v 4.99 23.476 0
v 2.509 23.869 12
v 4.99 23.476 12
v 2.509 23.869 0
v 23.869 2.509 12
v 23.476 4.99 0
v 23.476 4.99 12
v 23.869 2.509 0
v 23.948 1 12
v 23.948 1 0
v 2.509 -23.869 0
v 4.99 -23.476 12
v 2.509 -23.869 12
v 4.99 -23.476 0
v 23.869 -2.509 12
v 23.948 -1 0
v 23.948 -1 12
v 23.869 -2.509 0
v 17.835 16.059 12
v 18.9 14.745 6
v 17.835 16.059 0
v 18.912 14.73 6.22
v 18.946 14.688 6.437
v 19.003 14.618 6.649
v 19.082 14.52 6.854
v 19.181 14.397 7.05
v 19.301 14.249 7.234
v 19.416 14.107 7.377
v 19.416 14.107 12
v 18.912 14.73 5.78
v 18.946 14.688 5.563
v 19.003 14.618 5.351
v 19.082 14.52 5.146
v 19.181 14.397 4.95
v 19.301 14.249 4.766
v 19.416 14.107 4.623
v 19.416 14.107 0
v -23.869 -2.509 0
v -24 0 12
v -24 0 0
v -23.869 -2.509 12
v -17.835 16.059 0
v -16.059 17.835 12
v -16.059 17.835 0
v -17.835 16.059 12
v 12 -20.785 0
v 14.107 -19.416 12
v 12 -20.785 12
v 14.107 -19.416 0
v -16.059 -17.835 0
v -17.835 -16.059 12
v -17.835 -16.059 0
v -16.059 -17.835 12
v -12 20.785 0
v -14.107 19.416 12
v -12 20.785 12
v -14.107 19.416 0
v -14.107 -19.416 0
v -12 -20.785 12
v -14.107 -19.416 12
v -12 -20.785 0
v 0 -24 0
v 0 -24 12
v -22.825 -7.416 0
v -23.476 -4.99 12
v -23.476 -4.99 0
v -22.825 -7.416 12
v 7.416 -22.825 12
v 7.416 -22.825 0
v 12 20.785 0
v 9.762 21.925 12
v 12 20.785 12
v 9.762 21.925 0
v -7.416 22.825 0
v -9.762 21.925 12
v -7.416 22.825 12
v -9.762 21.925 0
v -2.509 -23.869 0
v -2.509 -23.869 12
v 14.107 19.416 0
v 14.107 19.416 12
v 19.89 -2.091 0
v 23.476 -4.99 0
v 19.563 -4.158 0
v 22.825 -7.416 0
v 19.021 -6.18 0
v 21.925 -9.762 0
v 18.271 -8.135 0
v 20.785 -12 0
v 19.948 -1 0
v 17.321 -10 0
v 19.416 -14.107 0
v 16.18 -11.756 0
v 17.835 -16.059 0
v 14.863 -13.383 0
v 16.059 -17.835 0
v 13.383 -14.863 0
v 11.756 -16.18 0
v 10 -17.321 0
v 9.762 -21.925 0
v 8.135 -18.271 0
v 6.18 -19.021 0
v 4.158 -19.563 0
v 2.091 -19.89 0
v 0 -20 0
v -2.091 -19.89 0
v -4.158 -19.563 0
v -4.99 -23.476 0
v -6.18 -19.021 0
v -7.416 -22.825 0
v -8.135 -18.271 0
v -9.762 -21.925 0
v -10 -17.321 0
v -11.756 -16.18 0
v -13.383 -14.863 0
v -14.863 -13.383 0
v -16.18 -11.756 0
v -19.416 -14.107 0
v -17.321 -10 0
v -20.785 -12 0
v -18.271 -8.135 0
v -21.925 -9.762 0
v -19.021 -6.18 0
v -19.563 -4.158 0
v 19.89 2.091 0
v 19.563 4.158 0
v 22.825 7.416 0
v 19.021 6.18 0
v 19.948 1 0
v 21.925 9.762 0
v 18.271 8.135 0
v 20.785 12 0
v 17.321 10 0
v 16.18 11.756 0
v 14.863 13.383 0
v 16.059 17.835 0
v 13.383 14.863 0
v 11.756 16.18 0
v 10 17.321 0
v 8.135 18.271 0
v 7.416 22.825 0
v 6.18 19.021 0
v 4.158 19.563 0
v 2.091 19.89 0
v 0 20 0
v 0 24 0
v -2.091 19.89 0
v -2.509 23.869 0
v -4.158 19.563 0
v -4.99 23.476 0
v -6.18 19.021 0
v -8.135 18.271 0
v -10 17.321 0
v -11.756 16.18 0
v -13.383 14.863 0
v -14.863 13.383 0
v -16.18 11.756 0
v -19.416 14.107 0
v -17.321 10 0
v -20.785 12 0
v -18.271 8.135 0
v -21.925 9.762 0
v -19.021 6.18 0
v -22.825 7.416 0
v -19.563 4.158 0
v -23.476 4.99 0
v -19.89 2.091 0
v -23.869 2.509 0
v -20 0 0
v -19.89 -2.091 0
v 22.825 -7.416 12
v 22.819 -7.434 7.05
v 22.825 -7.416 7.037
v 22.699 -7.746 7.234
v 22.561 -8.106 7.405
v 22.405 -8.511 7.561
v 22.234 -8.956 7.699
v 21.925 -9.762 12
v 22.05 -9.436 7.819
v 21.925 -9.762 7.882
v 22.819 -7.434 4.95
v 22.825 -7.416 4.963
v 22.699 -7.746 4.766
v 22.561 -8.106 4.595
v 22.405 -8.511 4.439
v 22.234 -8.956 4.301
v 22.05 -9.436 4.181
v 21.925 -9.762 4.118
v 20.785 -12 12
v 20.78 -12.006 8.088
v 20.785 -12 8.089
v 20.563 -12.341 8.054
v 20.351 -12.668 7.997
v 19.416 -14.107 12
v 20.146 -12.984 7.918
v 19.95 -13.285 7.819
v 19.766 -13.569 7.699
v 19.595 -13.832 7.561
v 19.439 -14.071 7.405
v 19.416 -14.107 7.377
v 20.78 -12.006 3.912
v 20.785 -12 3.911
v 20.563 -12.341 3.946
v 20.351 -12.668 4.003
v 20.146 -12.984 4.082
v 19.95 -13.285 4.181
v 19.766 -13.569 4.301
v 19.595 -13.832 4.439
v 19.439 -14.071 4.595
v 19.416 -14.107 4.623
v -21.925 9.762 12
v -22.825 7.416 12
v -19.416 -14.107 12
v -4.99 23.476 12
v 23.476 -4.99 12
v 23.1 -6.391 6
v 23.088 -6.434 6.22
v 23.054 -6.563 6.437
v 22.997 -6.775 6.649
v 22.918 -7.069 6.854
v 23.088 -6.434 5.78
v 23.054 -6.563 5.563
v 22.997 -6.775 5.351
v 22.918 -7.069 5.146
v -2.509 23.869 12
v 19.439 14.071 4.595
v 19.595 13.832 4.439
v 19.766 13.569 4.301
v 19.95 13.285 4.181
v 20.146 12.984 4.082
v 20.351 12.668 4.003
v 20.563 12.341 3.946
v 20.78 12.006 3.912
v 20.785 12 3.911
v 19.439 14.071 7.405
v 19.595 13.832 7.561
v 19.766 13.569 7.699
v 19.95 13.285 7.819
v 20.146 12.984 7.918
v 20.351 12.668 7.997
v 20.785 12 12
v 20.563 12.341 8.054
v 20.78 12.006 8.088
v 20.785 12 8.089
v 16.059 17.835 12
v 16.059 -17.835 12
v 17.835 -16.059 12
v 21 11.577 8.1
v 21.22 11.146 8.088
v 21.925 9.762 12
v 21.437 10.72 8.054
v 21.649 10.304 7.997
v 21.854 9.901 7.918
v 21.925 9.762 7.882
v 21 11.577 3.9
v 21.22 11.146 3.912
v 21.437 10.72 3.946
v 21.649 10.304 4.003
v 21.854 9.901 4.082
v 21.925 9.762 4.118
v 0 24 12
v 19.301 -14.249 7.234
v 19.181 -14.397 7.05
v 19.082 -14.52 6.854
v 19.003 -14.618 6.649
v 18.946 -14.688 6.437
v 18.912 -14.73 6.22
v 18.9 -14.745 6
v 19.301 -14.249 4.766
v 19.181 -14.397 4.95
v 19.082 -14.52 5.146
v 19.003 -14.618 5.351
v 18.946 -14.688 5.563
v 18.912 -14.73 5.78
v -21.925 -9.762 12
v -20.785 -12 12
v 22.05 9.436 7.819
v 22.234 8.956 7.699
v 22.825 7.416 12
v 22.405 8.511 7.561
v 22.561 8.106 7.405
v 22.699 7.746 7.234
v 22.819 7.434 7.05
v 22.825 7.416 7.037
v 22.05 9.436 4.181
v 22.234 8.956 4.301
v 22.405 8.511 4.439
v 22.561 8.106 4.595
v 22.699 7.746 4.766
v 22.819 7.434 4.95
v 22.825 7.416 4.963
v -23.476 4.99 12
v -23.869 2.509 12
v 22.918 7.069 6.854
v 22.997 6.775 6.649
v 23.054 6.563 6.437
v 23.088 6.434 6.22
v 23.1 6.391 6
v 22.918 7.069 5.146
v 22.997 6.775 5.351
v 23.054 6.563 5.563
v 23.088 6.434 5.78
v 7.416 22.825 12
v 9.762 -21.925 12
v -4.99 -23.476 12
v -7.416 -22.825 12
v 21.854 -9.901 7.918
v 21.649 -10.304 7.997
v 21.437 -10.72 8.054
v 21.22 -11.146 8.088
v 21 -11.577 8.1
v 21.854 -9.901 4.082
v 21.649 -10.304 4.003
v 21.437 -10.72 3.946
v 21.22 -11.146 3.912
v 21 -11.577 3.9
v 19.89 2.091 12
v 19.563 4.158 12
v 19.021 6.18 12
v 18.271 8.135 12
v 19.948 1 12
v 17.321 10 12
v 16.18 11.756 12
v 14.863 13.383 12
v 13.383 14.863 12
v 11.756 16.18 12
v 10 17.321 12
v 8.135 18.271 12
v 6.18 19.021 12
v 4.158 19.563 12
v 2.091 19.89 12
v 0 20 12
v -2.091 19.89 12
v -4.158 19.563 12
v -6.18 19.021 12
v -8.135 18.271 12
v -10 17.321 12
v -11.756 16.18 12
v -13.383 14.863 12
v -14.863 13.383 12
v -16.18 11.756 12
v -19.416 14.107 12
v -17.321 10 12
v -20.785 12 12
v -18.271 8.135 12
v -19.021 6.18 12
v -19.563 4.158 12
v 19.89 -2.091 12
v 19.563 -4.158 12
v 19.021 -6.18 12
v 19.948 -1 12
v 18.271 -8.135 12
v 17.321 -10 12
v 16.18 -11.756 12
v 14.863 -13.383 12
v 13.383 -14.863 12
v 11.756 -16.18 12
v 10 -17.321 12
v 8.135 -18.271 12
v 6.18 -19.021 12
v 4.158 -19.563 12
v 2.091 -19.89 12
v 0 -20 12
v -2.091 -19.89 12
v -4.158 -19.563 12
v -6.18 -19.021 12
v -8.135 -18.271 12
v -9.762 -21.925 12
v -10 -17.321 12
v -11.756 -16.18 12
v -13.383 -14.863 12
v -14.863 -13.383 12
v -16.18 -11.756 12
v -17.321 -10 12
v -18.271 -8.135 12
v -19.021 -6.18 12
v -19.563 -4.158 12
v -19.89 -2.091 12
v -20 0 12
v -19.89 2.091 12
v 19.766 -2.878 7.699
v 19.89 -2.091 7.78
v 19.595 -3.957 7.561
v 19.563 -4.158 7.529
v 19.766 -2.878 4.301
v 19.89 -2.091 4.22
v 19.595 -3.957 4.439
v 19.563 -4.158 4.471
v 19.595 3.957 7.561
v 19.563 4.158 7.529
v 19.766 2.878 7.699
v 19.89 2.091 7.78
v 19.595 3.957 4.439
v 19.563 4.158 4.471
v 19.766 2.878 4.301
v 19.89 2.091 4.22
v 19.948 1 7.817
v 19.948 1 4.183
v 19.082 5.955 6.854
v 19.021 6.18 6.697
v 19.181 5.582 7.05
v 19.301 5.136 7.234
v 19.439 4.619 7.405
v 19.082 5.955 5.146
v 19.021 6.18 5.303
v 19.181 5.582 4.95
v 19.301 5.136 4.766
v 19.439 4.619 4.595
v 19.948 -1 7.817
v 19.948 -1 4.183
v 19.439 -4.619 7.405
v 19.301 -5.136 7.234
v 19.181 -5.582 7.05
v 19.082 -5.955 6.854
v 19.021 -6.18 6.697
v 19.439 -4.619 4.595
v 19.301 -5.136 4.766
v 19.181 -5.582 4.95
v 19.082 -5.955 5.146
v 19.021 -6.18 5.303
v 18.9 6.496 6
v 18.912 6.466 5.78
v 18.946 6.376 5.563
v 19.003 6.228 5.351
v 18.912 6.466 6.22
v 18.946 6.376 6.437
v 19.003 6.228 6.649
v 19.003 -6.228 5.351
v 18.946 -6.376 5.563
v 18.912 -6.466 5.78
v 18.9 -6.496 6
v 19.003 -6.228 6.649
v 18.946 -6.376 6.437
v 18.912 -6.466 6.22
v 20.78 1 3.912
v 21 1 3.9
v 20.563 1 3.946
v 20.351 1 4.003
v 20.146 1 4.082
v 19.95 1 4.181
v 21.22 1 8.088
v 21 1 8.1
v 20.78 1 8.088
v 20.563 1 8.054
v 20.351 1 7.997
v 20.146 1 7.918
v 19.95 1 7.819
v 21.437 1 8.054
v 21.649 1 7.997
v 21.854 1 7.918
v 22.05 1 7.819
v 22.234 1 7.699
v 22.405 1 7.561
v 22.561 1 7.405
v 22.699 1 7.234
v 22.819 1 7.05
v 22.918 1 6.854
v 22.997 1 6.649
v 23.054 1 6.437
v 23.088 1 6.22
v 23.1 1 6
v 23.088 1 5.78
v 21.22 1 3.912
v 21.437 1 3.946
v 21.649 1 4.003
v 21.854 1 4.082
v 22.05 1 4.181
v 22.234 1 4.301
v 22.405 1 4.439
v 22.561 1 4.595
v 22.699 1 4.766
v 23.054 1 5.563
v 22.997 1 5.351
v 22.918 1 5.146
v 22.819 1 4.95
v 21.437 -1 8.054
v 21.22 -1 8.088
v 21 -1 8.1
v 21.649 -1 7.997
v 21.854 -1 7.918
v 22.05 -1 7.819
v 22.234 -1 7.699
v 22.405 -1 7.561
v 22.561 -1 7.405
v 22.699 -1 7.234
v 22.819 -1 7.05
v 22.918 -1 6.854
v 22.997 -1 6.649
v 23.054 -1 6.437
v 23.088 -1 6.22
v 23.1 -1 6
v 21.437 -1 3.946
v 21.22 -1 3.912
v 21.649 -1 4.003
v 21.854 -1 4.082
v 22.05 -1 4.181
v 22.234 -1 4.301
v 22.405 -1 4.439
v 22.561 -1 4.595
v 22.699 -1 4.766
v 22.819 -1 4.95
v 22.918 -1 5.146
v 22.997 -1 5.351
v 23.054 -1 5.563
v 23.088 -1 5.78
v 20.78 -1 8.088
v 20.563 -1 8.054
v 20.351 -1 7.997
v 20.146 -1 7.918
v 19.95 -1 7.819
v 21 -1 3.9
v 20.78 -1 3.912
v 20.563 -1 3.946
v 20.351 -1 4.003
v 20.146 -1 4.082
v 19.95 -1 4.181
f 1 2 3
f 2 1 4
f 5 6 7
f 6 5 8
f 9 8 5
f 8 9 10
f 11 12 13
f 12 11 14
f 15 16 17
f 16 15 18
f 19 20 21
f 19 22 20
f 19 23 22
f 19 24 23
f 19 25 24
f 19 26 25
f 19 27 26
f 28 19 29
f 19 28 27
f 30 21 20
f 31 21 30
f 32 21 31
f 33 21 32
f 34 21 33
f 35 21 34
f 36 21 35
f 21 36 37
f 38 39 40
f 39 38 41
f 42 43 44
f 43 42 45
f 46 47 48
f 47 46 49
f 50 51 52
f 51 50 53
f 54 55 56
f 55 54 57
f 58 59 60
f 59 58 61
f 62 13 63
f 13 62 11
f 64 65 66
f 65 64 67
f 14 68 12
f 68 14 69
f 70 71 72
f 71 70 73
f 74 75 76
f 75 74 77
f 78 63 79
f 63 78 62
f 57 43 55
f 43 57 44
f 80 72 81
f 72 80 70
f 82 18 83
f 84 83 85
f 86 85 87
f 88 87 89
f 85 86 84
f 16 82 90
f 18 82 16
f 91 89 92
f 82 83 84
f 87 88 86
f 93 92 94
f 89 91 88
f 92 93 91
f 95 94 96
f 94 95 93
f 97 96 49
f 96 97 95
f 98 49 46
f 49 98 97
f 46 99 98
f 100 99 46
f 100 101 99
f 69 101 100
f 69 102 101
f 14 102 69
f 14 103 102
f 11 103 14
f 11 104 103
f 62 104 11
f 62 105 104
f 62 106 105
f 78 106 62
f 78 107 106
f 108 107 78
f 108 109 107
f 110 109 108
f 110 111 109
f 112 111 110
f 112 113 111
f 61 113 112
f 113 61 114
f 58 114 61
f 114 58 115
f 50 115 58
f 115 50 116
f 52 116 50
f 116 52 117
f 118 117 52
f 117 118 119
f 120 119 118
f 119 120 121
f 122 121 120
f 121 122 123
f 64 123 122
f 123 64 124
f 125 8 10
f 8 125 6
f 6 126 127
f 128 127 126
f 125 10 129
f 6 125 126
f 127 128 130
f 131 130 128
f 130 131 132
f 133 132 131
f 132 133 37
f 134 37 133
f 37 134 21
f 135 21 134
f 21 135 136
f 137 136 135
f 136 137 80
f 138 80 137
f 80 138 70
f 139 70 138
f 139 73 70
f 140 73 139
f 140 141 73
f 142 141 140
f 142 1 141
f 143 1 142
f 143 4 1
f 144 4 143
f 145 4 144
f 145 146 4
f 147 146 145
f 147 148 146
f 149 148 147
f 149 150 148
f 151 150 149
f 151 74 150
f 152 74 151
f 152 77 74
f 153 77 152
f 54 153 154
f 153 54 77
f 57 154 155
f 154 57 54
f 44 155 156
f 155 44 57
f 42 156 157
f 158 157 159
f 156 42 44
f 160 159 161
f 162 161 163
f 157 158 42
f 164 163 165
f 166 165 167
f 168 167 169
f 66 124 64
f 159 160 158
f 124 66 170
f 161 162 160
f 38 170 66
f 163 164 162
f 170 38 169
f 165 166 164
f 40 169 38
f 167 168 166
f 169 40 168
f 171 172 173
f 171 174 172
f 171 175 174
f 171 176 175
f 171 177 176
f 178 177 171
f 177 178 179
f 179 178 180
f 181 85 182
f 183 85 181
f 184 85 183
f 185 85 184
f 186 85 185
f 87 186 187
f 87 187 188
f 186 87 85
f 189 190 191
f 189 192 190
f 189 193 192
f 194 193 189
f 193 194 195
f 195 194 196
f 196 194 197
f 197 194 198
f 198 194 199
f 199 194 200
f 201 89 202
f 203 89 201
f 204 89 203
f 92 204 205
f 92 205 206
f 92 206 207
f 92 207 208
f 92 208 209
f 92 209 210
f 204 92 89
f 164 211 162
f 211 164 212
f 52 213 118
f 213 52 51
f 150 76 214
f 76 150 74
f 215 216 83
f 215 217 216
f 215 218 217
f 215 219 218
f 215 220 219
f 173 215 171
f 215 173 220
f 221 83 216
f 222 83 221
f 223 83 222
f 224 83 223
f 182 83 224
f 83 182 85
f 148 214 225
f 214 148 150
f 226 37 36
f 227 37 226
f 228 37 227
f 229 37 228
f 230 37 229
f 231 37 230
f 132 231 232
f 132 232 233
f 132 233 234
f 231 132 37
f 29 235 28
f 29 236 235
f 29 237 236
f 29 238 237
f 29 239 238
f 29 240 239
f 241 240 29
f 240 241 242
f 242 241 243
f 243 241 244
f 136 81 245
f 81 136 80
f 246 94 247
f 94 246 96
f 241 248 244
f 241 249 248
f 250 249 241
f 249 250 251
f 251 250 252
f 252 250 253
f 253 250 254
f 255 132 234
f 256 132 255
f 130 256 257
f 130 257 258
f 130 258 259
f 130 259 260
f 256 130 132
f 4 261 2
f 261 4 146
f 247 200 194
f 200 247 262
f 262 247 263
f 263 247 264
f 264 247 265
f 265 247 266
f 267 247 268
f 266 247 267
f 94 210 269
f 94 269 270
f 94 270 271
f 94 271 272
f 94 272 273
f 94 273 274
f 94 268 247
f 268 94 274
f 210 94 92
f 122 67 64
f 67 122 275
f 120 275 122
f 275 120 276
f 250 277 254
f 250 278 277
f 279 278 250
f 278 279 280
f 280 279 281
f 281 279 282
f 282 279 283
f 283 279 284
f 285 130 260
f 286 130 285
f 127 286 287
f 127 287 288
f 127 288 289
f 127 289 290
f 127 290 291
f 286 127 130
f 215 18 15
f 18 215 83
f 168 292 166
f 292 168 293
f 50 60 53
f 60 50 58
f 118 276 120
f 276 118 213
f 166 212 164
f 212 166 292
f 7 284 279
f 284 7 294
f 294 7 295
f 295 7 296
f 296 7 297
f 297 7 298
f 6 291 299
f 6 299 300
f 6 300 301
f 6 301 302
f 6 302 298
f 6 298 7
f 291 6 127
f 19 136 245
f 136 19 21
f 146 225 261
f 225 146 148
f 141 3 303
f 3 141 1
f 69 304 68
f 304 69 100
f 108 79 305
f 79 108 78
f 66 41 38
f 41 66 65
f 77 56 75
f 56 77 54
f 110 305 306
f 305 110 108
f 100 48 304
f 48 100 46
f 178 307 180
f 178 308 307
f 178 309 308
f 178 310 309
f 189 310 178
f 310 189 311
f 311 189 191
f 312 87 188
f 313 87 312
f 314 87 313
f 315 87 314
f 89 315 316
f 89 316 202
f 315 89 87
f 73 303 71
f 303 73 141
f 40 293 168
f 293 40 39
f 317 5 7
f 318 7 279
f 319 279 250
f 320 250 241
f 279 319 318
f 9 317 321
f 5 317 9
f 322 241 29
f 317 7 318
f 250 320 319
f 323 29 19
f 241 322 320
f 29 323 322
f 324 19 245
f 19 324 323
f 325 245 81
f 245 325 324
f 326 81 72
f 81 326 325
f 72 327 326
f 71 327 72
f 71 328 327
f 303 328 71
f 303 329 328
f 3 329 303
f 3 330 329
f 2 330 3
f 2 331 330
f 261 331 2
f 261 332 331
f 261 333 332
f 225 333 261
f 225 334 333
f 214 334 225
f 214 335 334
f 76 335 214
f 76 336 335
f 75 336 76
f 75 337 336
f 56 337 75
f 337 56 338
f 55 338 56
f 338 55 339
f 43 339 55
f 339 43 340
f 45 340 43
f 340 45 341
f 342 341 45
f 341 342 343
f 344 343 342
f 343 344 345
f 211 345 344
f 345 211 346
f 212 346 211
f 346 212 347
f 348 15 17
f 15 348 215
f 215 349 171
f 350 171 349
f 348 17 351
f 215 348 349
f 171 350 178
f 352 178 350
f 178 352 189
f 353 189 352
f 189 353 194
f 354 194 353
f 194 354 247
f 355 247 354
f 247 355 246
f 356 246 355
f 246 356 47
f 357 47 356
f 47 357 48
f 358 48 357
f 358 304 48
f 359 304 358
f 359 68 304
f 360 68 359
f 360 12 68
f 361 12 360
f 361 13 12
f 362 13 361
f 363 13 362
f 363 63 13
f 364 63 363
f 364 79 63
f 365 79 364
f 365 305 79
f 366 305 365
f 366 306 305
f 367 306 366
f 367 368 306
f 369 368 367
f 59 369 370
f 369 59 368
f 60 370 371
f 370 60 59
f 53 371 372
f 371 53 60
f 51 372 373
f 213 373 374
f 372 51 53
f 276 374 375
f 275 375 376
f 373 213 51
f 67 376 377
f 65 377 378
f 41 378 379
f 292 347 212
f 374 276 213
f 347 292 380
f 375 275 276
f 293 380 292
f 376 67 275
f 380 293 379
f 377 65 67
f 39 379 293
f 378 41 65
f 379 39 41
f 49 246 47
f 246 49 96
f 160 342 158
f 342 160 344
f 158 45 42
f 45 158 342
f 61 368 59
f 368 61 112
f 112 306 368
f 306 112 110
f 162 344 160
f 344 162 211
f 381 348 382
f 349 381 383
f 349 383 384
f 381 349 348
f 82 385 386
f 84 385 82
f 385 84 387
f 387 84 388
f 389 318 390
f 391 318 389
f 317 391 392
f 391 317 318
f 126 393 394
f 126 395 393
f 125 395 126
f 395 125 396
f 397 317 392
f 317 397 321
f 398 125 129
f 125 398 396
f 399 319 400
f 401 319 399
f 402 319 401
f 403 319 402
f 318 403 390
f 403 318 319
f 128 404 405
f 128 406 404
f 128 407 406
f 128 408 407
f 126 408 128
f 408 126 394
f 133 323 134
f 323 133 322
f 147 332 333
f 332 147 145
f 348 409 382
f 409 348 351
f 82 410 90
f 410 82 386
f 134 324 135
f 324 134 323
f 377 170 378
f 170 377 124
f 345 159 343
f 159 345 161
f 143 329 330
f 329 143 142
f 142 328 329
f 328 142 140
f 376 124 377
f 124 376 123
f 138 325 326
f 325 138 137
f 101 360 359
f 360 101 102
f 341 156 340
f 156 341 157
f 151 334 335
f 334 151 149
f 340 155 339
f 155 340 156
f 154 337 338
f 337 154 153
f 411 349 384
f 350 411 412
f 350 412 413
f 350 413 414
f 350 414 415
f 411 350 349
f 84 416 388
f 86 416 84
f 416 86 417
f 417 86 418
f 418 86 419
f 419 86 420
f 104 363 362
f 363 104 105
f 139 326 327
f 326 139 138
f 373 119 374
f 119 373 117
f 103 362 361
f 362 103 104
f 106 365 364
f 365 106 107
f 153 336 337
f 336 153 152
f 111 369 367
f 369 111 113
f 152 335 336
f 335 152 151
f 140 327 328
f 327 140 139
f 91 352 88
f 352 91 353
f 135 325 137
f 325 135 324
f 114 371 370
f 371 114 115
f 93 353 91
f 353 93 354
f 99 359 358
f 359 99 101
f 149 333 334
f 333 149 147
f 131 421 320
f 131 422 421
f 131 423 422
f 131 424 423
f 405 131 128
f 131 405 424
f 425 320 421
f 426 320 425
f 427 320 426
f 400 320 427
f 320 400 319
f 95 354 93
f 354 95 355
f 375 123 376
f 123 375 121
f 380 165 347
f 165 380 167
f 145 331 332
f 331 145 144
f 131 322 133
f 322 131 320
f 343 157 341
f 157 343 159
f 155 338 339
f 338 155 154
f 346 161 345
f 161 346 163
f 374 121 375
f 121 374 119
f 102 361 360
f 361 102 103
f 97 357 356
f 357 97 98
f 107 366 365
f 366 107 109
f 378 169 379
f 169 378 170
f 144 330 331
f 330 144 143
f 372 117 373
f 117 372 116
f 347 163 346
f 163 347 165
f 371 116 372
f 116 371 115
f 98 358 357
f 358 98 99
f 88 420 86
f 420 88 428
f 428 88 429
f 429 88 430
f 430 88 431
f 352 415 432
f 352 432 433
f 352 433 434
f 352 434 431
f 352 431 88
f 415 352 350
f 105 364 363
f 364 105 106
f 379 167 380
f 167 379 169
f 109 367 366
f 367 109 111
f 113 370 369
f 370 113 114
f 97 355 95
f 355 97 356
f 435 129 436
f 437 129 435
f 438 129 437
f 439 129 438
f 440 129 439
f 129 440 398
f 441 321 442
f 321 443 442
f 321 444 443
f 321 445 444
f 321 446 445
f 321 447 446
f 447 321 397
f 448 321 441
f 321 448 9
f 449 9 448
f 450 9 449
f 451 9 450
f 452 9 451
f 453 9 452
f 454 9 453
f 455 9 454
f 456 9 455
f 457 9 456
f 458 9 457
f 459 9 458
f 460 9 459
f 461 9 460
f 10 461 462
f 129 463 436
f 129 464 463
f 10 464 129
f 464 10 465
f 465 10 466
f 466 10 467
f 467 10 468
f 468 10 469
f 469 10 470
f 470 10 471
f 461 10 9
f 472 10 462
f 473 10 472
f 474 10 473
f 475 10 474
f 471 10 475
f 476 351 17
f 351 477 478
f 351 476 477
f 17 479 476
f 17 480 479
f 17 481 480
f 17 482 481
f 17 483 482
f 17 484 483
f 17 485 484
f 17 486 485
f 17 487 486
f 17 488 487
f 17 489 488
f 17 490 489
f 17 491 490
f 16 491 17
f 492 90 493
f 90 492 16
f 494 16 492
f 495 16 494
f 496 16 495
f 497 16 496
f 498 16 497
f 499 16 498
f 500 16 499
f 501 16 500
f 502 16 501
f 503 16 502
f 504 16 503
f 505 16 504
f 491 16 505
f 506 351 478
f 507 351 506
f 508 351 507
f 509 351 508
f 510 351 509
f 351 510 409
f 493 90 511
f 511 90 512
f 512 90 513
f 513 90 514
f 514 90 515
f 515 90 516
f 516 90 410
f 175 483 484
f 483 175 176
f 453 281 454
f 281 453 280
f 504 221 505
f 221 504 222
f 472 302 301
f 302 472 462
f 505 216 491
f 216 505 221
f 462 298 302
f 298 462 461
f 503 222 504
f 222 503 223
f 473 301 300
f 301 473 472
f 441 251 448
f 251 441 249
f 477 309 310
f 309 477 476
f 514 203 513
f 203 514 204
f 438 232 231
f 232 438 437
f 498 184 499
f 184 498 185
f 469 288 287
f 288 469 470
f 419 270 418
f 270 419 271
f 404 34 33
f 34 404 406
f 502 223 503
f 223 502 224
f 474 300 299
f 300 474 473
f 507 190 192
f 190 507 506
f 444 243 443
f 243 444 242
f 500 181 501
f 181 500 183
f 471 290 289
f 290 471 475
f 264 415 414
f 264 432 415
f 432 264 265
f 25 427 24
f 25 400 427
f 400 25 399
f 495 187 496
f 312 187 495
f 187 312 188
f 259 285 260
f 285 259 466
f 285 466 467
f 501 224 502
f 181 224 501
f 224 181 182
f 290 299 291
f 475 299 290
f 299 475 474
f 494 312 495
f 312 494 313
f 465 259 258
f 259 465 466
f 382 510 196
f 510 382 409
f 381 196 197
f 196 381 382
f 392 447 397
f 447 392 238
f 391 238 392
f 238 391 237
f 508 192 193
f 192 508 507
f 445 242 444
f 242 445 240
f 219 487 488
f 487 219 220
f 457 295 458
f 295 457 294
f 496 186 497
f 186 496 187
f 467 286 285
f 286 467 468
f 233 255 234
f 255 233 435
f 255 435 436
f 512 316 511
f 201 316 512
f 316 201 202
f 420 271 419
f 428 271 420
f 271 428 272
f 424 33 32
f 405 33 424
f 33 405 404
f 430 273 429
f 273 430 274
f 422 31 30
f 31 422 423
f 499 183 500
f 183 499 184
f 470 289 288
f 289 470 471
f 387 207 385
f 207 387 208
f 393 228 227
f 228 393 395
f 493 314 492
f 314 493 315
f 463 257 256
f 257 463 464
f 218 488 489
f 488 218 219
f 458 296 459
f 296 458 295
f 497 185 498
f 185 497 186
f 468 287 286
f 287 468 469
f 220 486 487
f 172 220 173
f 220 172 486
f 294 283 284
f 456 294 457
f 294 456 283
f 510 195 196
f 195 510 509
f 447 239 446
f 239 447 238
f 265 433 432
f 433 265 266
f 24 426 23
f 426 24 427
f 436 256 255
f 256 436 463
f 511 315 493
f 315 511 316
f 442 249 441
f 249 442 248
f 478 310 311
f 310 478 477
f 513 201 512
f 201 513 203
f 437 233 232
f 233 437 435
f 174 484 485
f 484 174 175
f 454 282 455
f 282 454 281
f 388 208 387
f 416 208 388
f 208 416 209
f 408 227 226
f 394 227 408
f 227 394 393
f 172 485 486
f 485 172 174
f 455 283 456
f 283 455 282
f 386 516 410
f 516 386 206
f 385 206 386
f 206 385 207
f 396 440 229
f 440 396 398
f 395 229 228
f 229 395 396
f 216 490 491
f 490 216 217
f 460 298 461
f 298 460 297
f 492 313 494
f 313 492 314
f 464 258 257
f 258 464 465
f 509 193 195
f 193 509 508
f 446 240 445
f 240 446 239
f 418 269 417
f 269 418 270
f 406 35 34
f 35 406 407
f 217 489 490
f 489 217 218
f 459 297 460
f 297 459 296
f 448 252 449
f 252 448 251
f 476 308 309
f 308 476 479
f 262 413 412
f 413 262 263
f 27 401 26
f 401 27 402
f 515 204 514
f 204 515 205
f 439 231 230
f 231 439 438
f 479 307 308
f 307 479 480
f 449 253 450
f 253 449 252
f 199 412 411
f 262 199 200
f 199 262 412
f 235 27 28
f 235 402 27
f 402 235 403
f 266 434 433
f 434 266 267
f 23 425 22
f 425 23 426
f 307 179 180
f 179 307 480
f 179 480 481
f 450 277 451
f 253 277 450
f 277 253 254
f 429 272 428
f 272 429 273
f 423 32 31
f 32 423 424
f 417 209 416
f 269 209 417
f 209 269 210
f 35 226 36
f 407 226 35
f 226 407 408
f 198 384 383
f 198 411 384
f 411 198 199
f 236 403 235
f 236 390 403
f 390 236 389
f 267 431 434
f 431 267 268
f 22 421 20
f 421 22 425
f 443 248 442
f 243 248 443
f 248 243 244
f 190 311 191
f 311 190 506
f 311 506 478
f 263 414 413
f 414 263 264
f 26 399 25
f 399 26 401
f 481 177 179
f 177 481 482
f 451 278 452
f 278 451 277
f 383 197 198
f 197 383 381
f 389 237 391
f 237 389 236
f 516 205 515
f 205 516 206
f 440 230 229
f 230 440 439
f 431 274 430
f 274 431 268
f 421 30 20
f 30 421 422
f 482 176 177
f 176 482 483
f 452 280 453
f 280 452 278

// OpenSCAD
// C-style pipe clamp.
$fn = 60;
eps = 0.02;
pipe_d = 40;
wall = 4;
outer_d = pipe_d+2*wall;
width = 12;
difference() {
    cylinder(d=outer_d,h=width);
    translate([0,0,-eps]) cylinder(d=pipe_d,h=width+2*eps);
    translate([0,-1,-eps]) cube([outer_d/2+eps,2,width+2*eps]);
    translate([outer_d/2-3,-outer_d/2-eps,width/2]) rotate([-90,0,0]) cylinder(d=4.2,h=outer_d+2*eps);
}
